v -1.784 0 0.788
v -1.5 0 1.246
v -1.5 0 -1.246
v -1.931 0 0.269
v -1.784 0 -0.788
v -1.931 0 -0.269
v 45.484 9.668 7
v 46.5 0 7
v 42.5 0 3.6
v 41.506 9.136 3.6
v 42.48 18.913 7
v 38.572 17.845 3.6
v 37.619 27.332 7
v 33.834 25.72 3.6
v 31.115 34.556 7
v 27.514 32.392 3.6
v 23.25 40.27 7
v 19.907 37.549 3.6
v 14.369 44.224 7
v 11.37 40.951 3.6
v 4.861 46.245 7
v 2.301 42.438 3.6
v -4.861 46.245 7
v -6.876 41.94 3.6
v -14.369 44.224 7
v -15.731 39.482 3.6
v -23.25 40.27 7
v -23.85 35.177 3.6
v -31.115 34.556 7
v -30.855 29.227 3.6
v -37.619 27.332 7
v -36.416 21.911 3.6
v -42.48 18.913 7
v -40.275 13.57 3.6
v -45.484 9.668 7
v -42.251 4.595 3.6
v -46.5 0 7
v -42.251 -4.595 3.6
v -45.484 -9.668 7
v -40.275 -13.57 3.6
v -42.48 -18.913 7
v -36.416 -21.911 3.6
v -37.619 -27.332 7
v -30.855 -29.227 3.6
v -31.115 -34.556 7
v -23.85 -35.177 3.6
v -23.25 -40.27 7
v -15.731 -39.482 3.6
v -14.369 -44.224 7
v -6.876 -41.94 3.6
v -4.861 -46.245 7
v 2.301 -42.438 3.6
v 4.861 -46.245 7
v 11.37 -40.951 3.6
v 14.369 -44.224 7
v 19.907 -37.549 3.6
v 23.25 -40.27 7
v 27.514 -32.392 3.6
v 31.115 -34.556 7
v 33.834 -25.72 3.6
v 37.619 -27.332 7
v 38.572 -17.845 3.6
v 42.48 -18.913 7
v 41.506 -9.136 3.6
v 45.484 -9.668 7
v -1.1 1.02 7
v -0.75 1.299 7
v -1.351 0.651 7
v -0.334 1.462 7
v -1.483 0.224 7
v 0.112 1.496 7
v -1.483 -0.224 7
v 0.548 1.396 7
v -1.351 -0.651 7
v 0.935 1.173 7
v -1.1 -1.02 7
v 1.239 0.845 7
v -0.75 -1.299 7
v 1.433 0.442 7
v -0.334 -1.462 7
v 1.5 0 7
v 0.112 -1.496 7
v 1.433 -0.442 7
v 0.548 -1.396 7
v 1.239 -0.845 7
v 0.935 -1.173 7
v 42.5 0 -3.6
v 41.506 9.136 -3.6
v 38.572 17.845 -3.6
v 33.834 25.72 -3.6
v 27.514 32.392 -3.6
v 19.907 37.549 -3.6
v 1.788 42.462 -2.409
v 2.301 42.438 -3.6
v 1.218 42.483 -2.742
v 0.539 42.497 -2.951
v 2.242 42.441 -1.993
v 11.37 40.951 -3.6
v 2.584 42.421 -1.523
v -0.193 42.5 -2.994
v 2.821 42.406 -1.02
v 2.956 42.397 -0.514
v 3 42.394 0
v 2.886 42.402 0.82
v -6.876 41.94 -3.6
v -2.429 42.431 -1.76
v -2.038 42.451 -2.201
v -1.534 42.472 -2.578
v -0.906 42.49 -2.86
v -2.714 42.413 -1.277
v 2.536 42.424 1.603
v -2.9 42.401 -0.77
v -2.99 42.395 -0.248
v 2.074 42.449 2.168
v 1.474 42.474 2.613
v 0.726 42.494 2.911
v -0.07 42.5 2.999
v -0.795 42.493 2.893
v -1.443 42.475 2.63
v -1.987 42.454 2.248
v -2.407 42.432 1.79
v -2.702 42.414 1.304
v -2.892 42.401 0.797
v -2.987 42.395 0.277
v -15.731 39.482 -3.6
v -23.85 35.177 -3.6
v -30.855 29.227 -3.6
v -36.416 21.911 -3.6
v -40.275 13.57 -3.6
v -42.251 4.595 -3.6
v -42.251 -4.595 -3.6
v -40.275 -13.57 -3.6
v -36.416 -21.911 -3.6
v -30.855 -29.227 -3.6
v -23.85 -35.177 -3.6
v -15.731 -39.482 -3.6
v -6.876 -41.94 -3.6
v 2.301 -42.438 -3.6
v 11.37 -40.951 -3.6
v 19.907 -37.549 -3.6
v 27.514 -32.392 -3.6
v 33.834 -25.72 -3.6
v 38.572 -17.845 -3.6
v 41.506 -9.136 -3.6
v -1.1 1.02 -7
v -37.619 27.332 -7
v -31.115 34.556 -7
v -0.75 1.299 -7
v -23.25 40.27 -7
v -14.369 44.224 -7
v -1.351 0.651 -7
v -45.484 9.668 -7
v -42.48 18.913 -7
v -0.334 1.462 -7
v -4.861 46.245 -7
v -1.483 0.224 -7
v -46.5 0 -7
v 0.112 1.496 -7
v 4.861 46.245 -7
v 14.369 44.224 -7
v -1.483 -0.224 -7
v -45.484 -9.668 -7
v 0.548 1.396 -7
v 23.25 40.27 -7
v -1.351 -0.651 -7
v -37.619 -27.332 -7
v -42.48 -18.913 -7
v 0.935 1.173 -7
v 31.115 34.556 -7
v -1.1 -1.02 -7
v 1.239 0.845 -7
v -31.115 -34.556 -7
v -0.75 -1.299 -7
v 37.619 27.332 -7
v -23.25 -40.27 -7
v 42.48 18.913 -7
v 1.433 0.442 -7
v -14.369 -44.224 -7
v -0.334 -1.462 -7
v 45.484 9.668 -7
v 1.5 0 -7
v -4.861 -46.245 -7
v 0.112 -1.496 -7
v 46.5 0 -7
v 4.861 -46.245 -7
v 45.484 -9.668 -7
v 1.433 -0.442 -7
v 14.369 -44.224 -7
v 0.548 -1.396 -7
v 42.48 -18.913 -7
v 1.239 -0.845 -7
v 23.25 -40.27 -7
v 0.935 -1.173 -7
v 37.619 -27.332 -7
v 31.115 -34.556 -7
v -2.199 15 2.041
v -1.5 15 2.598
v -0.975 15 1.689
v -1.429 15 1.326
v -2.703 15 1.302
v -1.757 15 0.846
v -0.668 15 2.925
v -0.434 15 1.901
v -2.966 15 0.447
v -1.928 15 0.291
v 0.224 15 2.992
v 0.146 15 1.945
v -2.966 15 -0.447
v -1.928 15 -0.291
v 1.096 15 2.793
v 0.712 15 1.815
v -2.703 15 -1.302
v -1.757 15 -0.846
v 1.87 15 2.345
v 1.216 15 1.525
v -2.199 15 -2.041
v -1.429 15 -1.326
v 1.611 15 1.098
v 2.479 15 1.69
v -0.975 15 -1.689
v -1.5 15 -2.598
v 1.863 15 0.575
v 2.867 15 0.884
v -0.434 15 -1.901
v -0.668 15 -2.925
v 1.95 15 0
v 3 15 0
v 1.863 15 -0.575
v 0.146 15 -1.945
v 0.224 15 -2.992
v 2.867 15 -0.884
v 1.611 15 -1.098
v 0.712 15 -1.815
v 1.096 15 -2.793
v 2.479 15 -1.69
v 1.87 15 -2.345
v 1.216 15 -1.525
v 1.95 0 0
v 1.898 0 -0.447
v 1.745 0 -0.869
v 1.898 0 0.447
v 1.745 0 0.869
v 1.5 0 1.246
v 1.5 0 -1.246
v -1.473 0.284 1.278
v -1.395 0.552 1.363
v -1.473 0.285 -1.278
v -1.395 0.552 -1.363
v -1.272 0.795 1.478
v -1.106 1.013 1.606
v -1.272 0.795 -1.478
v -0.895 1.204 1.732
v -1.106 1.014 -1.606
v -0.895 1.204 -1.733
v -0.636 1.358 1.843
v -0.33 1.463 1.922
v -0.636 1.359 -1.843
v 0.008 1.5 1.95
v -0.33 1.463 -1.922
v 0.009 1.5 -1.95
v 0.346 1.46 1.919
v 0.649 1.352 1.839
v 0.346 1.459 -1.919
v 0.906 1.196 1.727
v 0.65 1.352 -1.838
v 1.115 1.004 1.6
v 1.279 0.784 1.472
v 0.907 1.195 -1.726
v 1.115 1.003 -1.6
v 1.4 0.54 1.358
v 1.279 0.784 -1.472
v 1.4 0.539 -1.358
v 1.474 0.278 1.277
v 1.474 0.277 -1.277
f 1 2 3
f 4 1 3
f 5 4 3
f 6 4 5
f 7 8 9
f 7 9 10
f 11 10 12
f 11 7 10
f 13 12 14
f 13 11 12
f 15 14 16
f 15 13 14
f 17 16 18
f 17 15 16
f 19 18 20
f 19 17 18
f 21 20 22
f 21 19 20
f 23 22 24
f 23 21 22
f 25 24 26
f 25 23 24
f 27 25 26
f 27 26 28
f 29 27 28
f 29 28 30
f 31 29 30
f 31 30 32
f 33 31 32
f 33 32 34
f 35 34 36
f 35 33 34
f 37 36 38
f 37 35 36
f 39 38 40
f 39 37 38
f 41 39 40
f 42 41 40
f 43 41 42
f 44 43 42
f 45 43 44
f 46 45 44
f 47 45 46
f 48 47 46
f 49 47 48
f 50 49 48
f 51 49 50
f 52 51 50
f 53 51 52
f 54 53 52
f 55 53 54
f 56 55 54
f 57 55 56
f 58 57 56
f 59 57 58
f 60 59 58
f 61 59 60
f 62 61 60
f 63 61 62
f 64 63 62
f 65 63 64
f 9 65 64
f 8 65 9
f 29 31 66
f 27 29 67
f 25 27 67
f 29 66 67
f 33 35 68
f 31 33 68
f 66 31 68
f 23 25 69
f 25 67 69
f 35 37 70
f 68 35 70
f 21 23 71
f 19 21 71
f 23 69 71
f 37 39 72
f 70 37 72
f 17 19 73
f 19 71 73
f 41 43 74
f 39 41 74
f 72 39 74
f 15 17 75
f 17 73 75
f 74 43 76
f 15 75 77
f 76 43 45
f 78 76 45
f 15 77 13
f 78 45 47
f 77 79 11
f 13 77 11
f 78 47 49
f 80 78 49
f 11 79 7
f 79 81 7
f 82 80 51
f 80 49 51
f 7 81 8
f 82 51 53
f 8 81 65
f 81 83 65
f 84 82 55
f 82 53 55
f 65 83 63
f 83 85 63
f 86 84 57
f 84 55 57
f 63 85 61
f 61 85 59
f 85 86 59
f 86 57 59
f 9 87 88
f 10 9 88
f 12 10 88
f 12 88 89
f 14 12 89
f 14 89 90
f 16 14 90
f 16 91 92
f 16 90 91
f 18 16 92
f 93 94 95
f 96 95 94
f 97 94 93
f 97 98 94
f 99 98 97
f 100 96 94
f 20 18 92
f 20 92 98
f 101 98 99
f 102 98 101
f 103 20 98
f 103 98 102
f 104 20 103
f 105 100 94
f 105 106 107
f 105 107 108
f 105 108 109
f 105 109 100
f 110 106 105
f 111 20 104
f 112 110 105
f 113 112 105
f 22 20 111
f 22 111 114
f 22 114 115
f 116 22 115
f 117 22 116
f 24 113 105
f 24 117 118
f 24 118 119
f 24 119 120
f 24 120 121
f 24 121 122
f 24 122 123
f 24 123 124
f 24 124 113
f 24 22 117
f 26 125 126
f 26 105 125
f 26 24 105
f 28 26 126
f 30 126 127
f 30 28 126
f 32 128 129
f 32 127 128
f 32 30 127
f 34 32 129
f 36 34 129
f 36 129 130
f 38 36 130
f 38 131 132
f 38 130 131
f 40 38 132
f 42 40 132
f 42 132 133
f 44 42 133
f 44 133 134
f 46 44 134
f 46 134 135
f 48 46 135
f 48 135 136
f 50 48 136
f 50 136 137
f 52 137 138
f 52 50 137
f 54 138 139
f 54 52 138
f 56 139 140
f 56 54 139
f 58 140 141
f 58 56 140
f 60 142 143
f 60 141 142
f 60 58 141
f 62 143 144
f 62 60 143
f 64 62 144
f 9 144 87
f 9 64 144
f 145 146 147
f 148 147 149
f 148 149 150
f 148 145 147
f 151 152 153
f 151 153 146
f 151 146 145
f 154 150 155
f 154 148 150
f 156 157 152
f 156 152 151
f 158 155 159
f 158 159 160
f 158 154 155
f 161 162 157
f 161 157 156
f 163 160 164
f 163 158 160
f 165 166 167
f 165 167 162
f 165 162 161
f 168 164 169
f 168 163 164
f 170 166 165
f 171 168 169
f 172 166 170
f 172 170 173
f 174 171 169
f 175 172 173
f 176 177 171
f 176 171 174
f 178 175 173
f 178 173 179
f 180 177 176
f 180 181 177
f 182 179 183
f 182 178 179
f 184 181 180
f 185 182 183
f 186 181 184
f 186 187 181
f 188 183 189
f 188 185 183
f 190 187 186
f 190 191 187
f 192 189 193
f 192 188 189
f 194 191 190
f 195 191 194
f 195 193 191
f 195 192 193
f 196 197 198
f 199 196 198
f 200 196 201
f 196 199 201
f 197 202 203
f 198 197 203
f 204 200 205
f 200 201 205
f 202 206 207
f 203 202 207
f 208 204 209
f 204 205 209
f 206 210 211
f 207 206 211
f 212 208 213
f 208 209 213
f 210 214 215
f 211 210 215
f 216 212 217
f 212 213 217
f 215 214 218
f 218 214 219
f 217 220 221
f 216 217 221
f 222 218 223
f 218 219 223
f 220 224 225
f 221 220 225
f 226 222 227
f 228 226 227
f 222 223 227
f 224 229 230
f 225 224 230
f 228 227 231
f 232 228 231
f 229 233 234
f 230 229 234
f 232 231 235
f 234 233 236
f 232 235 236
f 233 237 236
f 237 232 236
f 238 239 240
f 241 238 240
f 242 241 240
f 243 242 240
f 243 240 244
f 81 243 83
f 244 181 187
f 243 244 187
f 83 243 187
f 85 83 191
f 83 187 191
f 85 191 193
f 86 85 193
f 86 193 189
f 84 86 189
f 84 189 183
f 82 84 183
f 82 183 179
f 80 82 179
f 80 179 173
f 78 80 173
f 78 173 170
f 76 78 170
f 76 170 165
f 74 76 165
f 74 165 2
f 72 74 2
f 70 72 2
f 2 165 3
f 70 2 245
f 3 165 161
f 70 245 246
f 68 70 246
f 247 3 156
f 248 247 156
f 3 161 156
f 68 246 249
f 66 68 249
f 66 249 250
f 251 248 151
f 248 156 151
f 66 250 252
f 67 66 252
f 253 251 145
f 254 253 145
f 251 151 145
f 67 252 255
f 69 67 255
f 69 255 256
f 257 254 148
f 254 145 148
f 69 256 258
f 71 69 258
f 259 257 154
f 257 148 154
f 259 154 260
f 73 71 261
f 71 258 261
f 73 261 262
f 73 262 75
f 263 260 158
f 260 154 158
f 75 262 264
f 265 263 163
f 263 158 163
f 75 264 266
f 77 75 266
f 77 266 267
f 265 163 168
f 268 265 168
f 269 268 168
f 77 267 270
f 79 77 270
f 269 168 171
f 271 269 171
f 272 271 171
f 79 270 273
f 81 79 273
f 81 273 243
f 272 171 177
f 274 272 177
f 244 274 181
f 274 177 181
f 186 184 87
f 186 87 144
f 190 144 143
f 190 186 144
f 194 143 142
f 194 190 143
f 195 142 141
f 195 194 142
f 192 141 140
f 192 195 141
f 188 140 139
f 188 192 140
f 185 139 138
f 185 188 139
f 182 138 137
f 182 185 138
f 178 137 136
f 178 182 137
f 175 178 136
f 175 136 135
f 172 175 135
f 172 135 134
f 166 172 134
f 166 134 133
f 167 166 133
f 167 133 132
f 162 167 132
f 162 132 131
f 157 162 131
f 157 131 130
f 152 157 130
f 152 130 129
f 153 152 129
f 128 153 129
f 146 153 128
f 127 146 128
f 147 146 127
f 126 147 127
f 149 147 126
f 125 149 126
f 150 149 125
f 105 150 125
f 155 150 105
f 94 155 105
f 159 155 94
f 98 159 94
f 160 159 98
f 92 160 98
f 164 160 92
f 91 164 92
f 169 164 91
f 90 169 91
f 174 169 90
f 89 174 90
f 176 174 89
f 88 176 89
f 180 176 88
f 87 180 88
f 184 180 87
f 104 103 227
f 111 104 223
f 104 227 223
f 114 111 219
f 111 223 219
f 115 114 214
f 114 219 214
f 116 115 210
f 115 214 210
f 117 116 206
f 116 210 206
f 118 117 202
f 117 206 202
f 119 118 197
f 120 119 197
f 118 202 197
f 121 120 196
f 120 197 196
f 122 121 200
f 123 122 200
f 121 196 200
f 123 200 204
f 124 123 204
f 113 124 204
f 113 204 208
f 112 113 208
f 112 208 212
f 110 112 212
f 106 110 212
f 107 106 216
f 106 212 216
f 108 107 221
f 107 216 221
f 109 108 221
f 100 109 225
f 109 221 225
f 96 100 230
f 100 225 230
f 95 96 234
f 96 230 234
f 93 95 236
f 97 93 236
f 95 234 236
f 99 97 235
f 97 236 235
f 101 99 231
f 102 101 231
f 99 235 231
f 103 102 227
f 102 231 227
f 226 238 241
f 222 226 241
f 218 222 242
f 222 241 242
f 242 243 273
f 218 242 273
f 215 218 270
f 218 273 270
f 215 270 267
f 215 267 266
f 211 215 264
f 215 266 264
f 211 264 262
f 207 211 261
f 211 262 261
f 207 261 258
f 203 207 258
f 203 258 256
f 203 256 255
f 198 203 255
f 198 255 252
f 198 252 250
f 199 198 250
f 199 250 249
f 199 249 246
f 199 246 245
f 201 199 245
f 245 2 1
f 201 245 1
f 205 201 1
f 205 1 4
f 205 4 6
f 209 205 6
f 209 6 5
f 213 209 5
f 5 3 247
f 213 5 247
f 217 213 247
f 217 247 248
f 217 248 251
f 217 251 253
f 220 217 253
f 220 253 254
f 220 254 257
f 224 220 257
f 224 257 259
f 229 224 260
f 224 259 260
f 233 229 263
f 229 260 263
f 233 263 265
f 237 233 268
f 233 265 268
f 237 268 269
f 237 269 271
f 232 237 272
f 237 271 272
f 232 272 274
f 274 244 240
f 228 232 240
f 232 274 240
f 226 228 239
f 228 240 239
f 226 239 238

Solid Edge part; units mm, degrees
sketch "Sketch1" plane through (0, 0, 0) normal (0, -1, 0) x (1, 0, 0)
  line L0 (1.5, -7) -> (46.5, -7)
  line L1 (46.5, -7) -> (42.5, -3.6)
  line L2 (42.5, -3.6) -> (42.5, 3.6)
  line L3 (42.5, 3.6) -> (46.5, 7)
  line L4 (46.5, 7) -> (1.5, 7)
  line L5 (1.5, 7) -> (1.5, -7)
  dimension "D1" = 1.5
  dimension "D2" = 42.5
  dimension "D3" = 4
  dimension "D4" = 7.2
  dimension "D5" = 14
revolve "RevolvedProtrusion1" add sketch "Sketch1" angle 360 about axis through (0, 0, 54) along (0, 0, -1)
fillet "Round1" [suppressed]
sketch "Sketch2" plane through (0, 0, 0) normal (0, -1, 0) x (1, 0, 0)
  circle A0 centre (0, 0) radius 1.95
  dimension "D1" = 3.9
extrude "Ausschnitt_1" cut sketch "Sketch2" against normal blind 55
extrude "Ausschnitt_2" [suppressed]
extrude "HALF" [suppressed]
sketch "Sketch3" plane through (0, 15, 0) normal (0, -1, 0) x (1, 0, 0)
  circle A0 centre (0, 0) radius 3
extrude "Ausschnitt_4" cut sketch "Sketch3" against normal blind 223
